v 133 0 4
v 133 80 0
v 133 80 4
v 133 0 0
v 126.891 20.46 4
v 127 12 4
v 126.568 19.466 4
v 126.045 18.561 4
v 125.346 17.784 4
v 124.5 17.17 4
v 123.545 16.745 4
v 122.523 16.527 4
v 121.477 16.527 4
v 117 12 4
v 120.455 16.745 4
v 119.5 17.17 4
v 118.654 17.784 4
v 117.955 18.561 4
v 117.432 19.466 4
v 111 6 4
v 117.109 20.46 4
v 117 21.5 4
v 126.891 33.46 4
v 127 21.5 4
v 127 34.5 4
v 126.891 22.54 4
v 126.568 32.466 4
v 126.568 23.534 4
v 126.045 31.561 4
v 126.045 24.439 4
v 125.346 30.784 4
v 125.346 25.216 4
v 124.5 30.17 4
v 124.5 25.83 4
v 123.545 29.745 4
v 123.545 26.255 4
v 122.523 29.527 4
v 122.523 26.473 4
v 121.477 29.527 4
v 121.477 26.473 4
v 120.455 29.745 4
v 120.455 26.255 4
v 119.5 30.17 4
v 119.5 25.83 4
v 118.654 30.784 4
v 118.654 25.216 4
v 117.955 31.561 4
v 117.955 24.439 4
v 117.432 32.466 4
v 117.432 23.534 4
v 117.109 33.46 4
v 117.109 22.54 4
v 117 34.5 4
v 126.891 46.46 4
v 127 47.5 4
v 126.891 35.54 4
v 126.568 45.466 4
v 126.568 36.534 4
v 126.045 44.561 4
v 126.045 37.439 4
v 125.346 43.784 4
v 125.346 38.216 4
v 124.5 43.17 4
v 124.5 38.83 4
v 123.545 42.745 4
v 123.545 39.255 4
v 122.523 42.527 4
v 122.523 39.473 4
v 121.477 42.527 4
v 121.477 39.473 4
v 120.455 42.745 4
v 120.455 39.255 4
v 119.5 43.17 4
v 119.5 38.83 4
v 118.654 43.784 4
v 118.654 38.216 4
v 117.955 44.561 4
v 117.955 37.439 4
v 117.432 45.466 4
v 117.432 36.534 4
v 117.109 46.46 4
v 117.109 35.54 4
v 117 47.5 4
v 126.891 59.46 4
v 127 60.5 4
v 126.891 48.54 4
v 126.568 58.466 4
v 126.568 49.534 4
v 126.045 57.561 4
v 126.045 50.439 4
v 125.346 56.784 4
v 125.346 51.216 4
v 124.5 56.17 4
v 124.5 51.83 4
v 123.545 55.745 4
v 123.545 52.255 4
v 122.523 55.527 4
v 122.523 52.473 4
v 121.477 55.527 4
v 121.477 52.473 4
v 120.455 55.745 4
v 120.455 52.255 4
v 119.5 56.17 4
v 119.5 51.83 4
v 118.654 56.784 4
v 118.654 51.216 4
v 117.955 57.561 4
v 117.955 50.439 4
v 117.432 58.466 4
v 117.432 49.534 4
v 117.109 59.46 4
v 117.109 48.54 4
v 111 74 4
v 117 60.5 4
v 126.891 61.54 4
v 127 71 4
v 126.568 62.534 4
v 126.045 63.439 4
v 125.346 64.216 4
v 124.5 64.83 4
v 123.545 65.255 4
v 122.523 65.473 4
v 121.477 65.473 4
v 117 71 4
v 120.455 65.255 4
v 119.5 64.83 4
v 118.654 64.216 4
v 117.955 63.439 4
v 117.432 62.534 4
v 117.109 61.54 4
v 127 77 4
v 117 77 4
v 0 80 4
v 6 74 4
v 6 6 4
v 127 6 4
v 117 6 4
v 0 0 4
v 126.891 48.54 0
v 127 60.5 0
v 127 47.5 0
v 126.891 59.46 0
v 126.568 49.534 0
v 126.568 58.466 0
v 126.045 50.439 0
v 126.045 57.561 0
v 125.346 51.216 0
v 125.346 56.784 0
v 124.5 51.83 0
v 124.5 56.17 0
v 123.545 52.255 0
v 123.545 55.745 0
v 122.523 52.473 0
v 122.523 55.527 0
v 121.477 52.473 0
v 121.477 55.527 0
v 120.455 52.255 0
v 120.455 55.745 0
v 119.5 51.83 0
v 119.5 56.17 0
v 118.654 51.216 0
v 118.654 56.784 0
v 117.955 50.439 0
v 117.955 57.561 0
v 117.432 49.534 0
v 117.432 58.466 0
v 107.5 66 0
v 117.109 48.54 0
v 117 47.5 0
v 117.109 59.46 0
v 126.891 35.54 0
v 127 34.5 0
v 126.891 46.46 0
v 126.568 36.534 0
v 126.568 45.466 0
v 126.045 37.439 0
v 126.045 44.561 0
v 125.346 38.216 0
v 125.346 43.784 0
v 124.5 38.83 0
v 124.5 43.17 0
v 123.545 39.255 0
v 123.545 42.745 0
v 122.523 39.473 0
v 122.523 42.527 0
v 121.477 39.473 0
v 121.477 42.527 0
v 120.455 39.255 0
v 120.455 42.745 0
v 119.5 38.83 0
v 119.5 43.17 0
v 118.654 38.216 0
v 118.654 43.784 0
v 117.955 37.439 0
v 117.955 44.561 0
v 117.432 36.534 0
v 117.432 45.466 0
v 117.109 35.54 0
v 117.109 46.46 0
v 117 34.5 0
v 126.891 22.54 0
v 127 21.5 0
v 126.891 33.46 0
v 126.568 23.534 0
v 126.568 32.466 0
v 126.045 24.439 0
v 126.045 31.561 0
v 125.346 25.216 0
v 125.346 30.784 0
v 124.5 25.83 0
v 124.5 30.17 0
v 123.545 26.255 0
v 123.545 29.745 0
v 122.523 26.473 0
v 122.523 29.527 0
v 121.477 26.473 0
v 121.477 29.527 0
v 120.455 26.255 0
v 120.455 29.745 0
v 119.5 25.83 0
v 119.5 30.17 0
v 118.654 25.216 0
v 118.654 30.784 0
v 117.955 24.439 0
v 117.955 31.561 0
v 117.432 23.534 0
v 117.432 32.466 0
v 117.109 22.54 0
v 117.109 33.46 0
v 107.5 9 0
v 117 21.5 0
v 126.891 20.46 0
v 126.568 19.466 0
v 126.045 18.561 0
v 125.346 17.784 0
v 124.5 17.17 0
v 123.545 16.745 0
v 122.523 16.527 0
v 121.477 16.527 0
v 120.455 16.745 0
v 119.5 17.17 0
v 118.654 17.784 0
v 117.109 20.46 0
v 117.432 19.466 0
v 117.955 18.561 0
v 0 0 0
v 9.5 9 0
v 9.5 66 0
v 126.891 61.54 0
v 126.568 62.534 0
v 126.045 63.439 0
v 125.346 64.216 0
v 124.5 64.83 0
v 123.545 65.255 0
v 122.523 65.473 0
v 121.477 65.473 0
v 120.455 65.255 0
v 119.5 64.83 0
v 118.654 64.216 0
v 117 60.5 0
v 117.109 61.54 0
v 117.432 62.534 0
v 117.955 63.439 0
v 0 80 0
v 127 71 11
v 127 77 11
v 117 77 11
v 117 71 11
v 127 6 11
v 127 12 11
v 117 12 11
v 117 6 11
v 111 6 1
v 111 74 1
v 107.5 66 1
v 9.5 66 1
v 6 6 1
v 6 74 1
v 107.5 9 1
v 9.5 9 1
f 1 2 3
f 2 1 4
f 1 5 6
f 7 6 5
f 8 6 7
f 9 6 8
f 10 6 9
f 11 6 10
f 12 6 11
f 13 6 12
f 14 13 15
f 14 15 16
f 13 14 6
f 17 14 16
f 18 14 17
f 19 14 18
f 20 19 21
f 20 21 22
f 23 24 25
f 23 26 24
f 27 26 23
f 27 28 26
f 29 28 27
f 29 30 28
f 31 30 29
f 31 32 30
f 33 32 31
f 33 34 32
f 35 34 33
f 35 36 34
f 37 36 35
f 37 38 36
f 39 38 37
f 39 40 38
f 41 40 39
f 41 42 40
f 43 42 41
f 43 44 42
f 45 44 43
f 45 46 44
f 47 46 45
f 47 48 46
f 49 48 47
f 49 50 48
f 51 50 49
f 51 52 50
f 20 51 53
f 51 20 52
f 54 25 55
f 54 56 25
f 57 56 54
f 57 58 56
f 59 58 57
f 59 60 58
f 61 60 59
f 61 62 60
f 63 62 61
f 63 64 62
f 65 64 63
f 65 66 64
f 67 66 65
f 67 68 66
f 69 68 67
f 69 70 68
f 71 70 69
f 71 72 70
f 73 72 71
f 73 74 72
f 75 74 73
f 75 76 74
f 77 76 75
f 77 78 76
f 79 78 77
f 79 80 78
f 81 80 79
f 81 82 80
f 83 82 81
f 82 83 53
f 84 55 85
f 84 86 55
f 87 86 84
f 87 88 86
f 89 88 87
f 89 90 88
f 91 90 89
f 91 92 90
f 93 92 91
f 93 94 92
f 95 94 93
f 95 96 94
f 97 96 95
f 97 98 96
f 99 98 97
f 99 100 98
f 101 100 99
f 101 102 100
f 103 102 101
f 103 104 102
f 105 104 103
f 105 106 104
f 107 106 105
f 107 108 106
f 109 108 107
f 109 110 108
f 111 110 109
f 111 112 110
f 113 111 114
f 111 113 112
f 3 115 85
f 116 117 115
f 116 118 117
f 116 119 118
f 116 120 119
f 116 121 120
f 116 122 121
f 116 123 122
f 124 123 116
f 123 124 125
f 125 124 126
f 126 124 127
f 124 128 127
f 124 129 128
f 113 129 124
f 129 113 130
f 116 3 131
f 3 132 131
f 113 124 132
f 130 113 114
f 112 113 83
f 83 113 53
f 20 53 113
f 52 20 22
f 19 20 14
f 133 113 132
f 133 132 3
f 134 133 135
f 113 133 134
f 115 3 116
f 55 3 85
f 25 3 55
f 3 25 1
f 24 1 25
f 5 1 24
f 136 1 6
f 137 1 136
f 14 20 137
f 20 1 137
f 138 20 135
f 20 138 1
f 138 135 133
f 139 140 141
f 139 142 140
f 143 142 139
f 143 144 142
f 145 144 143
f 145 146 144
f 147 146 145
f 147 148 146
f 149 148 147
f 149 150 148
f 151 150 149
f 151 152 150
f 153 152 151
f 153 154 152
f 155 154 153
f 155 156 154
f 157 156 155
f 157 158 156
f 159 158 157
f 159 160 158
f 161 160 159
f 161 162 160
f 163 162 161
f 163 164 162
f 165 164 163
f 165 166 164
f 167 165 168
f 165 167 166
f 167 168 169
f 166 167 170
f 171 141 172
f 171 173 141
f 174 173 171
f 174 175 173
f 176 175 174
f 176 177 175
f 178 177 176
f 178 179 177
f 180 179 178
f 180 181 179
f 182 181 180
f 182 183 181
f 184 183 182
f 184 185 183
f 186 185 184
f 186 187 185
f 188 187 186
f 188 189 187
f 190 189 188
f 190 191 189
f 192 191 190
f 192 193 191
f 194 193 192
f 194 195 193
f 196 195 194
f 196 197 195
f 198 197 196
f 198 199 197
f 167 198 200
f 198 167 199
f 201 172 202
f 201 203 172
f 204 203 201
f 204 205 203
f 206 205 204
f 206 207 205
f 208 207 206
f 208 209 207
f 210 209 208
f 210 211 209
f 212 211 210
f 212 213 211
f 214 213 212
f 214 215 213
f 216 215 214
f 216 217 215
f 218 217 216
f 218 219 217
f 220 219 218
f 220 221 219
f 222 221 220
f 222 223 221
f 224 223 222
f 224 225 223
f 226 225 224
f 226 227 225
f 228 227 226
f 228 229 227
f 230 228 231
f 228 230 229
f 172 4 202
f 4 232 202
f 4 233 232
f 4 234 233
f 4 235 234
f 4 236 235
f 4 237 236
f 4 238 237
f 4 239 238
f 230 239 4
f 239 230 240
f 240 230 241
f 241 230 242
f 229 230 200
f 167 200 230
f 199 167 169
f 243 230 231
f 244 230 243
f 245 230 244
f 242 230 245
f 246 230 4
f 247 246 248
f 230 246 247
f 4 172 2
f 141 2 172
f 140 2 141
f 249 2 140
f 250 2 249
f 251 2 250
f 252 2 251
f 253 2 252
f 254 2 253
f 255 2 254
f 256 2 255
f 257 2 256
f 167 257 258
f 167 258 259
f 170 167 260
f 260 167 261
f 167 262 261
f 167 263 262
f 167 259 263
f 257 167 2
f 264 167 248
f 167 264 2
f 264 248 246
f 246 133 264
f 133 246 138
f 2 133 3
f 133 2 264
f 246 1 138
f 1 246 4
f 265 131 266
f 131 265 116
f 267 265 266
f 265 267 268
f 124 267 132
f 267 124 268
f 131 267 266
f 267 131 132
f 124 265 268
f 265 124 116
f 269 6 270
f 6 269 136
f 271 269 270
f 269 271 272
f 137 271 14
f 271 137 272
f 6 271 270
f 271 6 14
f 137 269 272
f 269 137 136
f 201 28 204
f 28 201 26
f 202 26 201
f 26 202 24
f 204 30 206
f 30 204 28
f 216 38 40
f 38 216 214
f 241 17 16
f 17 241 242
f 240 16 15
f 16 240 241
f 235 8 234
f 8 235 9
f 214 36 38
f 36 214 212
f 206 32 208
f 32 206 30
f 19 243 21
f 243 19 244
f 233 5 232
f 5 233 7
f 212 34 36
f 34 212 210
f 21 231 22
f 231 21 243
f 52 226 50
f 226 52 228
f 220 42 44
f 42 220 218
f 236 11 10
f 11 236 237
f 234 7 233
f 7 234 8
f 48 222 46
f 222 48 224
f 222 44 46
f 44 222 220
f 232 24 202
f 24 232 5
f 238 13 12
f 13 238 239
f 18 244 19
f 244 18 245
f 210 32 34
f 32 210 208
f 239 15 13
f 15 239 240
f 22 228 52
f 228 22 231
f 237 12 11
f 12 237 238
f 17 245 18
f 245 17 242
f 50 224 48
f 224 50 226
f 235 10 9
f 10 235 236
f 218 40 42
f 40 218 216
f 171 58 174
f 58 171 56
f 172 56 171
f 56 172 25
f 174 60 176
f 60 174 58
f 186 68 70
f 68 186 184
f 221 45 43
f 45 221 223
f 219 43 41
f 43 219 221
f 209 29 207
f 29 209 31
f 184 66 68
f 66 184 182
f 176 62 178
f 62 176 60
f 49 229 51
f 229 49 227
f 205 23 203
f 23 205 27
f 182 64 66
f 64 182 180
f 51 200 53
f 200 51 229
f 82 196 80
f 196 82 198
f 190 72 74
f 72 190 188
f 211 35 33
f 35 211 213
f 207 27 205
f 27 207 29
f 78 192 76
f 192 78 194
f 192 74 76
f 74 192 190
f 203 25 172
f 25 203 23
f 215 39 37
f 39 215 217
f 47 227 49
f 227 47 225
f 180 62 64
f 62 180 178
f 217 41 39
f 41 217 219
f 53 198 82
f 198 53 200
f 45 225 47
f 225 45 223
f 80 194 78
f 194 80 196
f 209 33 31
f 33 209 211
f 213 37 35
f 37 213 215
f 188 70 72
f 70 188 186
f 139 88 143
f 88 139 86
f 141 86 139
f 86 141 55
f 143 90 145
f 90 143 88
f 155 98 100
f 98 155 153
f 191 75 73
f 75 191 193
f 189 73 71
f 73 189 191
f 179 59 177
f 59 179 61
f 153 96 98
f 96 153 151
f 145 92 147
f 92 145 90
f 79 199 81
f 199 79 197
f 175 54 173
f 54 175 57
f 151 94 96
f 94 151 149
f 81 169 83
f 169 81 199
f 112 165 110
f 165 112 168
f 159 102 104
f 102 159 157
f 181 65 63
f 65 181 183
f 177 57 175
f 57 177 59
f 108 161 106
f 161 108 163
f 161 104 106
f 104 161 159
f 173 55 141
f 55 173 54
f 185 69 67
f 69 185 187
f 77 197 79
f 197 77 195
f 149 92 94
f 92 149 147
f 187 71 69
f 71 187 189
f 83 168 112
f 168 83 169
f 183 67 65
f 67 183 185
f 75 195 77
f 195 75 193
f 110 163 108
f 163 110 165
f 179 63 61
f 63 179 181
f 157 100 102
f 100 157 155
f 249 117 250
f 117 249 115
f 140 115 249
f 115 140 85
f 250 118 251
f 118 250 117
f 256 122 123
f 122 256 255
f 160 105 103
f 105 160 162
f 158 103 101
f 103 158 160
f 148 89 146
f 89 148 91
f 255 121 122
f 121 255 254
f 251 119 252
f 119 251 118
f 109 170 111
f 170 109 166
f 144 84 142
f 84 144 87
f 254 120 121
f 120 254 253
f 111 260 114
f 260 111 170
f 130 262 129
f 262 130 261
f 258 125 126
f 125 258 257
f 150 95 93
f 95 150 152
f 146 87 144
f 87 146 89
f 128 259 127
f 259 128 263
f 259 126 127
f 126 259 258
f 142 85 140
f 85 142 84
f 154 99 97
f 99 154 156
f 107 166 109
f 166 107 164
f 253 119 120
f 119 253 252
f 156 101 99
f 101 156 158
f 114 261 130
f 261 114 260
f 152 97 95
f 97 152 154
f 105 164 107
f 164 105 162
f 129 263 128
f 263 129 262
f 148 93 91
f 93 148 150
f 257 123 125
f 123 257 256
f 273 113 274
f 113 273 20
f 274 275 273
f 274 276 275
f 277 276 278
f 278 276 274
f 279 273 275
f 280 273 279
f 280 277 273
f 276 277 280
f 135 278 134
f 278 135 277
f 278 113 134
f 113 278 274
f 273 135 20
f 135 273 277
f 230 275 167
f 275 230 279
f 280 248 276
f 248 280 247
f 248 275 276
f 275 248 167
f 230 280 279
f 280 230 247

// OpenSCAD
// file: pistation.scad
/*--------------------------------------------------------------------------*
* Defines all the sizes we need. This file is used by all other SCADs
*--------------------------------------------------------------------------*/

// Define the dimensions of the things we need to place
LCD_OUTER_WIDTH  = 105;
LCD_OUTER_HEIGHT = 68;
LCD_OUTER_DEPTH  = 3;

LCD_INNER_WIDTH  = 98;
LCD_INNER_HEIGHT = 57;
LCD_INNER_DEPTH  = 1;

LCD_UPPER_SPACE = 3;
LCD_LOWER_SPACE = 8;
LCD_LEFT_SPACE  = 3.5;
LCD_RIGHT_SPACE = 3.5;

BUTTON_DIAMETER = 10;
BUTTON_DEPTH    = 7;
BUTTON_SPACE    = 3;

GENERAL_SPACE   = 6;

FRAME_WIDTH = 80;
FRAME_STEP  = 10;

FRONT_ANGLE = 10;

MDF_SIZE = 3;

// Now calculate the extra sizes
BLOCK_WIDTH  = GENERAL_SPACE + LCD_OUTER_WIDTH + GENERAL_SPACE + BUTTON_DIAMETER + GENERAL_SPACE;
BLOCK_HEIGHT = GENERAL_SPACE + LCD_OUTER_HEIGHT + GENERAL_SPACE;
BLOCK_DEPTH  = LCD_OUTER_DEPTH + LCD_INNER_DEPTH;

TOTAL_BUTTON_HEIGHT = 4 * (BUTTON_DIAMETER + BUTTON_SPACE);
TOTAL_BUTTON_WIDTH  = BUTTON_DIAMETER;

PANEL_SIDE_WIDTH  = BLOCK_HEIGHT * sin(FRONT_ANGLE);
PANEL_SIDE_HEIGHT = BLOCK_HEIGHT * cos(FRONT_ANGLE);

FRAME_HEIGHT = FRAME_STEP + PANEL_SIDE_HEIGHT;

/** Create a frame
 *
 * This creates the left frame (without any cutouts). It is used as the basis
 * for the left and right frame SCAD files.
 */
module frame() {
  // Let's make the frame components
  cube(size = [ FRAME_WIDTH, GENERAL_SPACE, GENERAL_SPACE ], center = false);
  cube(size = [ GENERAL_SPACE, FRAME_STEP, GENERAL_SPACE ], center = false);
  translate(v = [ PANEL_SIDE_WIDTH, 0, 0 ]) {
    cube(size = [ GENERAL_SPACE, FRAME_HEIGHT, GENERAL_SPACE ], center = false);
    }
  translate(v = [ 0, FRAME_STEP, 0 ]) {
    rotate(a = [ 0, 0, -FRONT_ANGLE ]) {
      cube(size = [ GENERAL_SPACE, BLOCK_HEIGHT, GENERAL_SPACE ], center = false);
      }
    }
  }
// main file
/*--------------------------------------------------------------------------*
* Describes the front section for the PiStation. This part holds the screen
* and the buttons.
*--------------------------------------------------------------------------*/
include <pistation.scad>

// Make the buttons
module buttons() {
  for(btn = [ 0:3 ]) {
    translate(v = [ BUTTON_DIAMETER / 2, BUTTON_DIAMETER + (btn * (BUTTON_DIAMETER + BUTTON_SPACE)), 0 ]) {
      cylinder(h = LCD_OUTER_HEIGHT * 2, r = BUTTON_DIAMETER / 2, $fs = 0.1);
      }
    }
  }

// Main program
difference() {
  // Create the main block (with mounts for the button PCB)
  union() {
    cube([ BLOCK_WIDTH, BLOCK_HEIGHT, BLOCK_DEPTH ], center = false);
    translate(v = [ BLOCK_WIDTH - BUTTON_DIAMETER - GENERAL_SPACE, BLOCK_HEIGHT - (1.5 * GENERAL_SPACE), BLOCK_DEPTH ]) {
      cube([ BUTTON_DIAMETER, GENERAL_SPACE, 7 ], center = false);
      }
    translate(v = [ BLOCK_WIDTH - BUTTON_DIAMETER - GENERAL_SPACE, GENERAL_SPACE, BLOCK_DEPTH ]) {
      cube([ BUTTON_DIAMETER, GENERAL_SPACE, 7 ], center = false);
      }
    }
  // Cut out the holes for the LCD
  translate(v = [ GENERAL_SPACE, GENERAL_SPACE, LCD_INNER_DEPTH ]) {
    cube([ LCD_OUTER_WIDTH, LCD_OUTER_HEIGHT, LCD_OUTER_DEPTH + GENERAL_SPACE ], center = false);
    }
  translate(v = [ GENERAL_SPACE + LCD_LEFT_SPACE, GENERAL_SPACE + LCD_UPPER_SPACE, 0 ]) {
    cube([ LCD_INNER_WIDTH, LCD_INNER_HEIGHT, LCD_OUTER_DEPTH + GENERAL_SPACE ], center = false);
    }
  translate(v = [ GENERAL_SPACE + LCD_OUTER_WIDTH + GENERAL_SPACE, GENERAL_SPACE + LCD_UPPER_SPACE + (LCD_INNER_HEIGHT - TOTAL_BUTTON_HEIGHT) / 2, 0 ]) {
    buttons();
    }
  }
